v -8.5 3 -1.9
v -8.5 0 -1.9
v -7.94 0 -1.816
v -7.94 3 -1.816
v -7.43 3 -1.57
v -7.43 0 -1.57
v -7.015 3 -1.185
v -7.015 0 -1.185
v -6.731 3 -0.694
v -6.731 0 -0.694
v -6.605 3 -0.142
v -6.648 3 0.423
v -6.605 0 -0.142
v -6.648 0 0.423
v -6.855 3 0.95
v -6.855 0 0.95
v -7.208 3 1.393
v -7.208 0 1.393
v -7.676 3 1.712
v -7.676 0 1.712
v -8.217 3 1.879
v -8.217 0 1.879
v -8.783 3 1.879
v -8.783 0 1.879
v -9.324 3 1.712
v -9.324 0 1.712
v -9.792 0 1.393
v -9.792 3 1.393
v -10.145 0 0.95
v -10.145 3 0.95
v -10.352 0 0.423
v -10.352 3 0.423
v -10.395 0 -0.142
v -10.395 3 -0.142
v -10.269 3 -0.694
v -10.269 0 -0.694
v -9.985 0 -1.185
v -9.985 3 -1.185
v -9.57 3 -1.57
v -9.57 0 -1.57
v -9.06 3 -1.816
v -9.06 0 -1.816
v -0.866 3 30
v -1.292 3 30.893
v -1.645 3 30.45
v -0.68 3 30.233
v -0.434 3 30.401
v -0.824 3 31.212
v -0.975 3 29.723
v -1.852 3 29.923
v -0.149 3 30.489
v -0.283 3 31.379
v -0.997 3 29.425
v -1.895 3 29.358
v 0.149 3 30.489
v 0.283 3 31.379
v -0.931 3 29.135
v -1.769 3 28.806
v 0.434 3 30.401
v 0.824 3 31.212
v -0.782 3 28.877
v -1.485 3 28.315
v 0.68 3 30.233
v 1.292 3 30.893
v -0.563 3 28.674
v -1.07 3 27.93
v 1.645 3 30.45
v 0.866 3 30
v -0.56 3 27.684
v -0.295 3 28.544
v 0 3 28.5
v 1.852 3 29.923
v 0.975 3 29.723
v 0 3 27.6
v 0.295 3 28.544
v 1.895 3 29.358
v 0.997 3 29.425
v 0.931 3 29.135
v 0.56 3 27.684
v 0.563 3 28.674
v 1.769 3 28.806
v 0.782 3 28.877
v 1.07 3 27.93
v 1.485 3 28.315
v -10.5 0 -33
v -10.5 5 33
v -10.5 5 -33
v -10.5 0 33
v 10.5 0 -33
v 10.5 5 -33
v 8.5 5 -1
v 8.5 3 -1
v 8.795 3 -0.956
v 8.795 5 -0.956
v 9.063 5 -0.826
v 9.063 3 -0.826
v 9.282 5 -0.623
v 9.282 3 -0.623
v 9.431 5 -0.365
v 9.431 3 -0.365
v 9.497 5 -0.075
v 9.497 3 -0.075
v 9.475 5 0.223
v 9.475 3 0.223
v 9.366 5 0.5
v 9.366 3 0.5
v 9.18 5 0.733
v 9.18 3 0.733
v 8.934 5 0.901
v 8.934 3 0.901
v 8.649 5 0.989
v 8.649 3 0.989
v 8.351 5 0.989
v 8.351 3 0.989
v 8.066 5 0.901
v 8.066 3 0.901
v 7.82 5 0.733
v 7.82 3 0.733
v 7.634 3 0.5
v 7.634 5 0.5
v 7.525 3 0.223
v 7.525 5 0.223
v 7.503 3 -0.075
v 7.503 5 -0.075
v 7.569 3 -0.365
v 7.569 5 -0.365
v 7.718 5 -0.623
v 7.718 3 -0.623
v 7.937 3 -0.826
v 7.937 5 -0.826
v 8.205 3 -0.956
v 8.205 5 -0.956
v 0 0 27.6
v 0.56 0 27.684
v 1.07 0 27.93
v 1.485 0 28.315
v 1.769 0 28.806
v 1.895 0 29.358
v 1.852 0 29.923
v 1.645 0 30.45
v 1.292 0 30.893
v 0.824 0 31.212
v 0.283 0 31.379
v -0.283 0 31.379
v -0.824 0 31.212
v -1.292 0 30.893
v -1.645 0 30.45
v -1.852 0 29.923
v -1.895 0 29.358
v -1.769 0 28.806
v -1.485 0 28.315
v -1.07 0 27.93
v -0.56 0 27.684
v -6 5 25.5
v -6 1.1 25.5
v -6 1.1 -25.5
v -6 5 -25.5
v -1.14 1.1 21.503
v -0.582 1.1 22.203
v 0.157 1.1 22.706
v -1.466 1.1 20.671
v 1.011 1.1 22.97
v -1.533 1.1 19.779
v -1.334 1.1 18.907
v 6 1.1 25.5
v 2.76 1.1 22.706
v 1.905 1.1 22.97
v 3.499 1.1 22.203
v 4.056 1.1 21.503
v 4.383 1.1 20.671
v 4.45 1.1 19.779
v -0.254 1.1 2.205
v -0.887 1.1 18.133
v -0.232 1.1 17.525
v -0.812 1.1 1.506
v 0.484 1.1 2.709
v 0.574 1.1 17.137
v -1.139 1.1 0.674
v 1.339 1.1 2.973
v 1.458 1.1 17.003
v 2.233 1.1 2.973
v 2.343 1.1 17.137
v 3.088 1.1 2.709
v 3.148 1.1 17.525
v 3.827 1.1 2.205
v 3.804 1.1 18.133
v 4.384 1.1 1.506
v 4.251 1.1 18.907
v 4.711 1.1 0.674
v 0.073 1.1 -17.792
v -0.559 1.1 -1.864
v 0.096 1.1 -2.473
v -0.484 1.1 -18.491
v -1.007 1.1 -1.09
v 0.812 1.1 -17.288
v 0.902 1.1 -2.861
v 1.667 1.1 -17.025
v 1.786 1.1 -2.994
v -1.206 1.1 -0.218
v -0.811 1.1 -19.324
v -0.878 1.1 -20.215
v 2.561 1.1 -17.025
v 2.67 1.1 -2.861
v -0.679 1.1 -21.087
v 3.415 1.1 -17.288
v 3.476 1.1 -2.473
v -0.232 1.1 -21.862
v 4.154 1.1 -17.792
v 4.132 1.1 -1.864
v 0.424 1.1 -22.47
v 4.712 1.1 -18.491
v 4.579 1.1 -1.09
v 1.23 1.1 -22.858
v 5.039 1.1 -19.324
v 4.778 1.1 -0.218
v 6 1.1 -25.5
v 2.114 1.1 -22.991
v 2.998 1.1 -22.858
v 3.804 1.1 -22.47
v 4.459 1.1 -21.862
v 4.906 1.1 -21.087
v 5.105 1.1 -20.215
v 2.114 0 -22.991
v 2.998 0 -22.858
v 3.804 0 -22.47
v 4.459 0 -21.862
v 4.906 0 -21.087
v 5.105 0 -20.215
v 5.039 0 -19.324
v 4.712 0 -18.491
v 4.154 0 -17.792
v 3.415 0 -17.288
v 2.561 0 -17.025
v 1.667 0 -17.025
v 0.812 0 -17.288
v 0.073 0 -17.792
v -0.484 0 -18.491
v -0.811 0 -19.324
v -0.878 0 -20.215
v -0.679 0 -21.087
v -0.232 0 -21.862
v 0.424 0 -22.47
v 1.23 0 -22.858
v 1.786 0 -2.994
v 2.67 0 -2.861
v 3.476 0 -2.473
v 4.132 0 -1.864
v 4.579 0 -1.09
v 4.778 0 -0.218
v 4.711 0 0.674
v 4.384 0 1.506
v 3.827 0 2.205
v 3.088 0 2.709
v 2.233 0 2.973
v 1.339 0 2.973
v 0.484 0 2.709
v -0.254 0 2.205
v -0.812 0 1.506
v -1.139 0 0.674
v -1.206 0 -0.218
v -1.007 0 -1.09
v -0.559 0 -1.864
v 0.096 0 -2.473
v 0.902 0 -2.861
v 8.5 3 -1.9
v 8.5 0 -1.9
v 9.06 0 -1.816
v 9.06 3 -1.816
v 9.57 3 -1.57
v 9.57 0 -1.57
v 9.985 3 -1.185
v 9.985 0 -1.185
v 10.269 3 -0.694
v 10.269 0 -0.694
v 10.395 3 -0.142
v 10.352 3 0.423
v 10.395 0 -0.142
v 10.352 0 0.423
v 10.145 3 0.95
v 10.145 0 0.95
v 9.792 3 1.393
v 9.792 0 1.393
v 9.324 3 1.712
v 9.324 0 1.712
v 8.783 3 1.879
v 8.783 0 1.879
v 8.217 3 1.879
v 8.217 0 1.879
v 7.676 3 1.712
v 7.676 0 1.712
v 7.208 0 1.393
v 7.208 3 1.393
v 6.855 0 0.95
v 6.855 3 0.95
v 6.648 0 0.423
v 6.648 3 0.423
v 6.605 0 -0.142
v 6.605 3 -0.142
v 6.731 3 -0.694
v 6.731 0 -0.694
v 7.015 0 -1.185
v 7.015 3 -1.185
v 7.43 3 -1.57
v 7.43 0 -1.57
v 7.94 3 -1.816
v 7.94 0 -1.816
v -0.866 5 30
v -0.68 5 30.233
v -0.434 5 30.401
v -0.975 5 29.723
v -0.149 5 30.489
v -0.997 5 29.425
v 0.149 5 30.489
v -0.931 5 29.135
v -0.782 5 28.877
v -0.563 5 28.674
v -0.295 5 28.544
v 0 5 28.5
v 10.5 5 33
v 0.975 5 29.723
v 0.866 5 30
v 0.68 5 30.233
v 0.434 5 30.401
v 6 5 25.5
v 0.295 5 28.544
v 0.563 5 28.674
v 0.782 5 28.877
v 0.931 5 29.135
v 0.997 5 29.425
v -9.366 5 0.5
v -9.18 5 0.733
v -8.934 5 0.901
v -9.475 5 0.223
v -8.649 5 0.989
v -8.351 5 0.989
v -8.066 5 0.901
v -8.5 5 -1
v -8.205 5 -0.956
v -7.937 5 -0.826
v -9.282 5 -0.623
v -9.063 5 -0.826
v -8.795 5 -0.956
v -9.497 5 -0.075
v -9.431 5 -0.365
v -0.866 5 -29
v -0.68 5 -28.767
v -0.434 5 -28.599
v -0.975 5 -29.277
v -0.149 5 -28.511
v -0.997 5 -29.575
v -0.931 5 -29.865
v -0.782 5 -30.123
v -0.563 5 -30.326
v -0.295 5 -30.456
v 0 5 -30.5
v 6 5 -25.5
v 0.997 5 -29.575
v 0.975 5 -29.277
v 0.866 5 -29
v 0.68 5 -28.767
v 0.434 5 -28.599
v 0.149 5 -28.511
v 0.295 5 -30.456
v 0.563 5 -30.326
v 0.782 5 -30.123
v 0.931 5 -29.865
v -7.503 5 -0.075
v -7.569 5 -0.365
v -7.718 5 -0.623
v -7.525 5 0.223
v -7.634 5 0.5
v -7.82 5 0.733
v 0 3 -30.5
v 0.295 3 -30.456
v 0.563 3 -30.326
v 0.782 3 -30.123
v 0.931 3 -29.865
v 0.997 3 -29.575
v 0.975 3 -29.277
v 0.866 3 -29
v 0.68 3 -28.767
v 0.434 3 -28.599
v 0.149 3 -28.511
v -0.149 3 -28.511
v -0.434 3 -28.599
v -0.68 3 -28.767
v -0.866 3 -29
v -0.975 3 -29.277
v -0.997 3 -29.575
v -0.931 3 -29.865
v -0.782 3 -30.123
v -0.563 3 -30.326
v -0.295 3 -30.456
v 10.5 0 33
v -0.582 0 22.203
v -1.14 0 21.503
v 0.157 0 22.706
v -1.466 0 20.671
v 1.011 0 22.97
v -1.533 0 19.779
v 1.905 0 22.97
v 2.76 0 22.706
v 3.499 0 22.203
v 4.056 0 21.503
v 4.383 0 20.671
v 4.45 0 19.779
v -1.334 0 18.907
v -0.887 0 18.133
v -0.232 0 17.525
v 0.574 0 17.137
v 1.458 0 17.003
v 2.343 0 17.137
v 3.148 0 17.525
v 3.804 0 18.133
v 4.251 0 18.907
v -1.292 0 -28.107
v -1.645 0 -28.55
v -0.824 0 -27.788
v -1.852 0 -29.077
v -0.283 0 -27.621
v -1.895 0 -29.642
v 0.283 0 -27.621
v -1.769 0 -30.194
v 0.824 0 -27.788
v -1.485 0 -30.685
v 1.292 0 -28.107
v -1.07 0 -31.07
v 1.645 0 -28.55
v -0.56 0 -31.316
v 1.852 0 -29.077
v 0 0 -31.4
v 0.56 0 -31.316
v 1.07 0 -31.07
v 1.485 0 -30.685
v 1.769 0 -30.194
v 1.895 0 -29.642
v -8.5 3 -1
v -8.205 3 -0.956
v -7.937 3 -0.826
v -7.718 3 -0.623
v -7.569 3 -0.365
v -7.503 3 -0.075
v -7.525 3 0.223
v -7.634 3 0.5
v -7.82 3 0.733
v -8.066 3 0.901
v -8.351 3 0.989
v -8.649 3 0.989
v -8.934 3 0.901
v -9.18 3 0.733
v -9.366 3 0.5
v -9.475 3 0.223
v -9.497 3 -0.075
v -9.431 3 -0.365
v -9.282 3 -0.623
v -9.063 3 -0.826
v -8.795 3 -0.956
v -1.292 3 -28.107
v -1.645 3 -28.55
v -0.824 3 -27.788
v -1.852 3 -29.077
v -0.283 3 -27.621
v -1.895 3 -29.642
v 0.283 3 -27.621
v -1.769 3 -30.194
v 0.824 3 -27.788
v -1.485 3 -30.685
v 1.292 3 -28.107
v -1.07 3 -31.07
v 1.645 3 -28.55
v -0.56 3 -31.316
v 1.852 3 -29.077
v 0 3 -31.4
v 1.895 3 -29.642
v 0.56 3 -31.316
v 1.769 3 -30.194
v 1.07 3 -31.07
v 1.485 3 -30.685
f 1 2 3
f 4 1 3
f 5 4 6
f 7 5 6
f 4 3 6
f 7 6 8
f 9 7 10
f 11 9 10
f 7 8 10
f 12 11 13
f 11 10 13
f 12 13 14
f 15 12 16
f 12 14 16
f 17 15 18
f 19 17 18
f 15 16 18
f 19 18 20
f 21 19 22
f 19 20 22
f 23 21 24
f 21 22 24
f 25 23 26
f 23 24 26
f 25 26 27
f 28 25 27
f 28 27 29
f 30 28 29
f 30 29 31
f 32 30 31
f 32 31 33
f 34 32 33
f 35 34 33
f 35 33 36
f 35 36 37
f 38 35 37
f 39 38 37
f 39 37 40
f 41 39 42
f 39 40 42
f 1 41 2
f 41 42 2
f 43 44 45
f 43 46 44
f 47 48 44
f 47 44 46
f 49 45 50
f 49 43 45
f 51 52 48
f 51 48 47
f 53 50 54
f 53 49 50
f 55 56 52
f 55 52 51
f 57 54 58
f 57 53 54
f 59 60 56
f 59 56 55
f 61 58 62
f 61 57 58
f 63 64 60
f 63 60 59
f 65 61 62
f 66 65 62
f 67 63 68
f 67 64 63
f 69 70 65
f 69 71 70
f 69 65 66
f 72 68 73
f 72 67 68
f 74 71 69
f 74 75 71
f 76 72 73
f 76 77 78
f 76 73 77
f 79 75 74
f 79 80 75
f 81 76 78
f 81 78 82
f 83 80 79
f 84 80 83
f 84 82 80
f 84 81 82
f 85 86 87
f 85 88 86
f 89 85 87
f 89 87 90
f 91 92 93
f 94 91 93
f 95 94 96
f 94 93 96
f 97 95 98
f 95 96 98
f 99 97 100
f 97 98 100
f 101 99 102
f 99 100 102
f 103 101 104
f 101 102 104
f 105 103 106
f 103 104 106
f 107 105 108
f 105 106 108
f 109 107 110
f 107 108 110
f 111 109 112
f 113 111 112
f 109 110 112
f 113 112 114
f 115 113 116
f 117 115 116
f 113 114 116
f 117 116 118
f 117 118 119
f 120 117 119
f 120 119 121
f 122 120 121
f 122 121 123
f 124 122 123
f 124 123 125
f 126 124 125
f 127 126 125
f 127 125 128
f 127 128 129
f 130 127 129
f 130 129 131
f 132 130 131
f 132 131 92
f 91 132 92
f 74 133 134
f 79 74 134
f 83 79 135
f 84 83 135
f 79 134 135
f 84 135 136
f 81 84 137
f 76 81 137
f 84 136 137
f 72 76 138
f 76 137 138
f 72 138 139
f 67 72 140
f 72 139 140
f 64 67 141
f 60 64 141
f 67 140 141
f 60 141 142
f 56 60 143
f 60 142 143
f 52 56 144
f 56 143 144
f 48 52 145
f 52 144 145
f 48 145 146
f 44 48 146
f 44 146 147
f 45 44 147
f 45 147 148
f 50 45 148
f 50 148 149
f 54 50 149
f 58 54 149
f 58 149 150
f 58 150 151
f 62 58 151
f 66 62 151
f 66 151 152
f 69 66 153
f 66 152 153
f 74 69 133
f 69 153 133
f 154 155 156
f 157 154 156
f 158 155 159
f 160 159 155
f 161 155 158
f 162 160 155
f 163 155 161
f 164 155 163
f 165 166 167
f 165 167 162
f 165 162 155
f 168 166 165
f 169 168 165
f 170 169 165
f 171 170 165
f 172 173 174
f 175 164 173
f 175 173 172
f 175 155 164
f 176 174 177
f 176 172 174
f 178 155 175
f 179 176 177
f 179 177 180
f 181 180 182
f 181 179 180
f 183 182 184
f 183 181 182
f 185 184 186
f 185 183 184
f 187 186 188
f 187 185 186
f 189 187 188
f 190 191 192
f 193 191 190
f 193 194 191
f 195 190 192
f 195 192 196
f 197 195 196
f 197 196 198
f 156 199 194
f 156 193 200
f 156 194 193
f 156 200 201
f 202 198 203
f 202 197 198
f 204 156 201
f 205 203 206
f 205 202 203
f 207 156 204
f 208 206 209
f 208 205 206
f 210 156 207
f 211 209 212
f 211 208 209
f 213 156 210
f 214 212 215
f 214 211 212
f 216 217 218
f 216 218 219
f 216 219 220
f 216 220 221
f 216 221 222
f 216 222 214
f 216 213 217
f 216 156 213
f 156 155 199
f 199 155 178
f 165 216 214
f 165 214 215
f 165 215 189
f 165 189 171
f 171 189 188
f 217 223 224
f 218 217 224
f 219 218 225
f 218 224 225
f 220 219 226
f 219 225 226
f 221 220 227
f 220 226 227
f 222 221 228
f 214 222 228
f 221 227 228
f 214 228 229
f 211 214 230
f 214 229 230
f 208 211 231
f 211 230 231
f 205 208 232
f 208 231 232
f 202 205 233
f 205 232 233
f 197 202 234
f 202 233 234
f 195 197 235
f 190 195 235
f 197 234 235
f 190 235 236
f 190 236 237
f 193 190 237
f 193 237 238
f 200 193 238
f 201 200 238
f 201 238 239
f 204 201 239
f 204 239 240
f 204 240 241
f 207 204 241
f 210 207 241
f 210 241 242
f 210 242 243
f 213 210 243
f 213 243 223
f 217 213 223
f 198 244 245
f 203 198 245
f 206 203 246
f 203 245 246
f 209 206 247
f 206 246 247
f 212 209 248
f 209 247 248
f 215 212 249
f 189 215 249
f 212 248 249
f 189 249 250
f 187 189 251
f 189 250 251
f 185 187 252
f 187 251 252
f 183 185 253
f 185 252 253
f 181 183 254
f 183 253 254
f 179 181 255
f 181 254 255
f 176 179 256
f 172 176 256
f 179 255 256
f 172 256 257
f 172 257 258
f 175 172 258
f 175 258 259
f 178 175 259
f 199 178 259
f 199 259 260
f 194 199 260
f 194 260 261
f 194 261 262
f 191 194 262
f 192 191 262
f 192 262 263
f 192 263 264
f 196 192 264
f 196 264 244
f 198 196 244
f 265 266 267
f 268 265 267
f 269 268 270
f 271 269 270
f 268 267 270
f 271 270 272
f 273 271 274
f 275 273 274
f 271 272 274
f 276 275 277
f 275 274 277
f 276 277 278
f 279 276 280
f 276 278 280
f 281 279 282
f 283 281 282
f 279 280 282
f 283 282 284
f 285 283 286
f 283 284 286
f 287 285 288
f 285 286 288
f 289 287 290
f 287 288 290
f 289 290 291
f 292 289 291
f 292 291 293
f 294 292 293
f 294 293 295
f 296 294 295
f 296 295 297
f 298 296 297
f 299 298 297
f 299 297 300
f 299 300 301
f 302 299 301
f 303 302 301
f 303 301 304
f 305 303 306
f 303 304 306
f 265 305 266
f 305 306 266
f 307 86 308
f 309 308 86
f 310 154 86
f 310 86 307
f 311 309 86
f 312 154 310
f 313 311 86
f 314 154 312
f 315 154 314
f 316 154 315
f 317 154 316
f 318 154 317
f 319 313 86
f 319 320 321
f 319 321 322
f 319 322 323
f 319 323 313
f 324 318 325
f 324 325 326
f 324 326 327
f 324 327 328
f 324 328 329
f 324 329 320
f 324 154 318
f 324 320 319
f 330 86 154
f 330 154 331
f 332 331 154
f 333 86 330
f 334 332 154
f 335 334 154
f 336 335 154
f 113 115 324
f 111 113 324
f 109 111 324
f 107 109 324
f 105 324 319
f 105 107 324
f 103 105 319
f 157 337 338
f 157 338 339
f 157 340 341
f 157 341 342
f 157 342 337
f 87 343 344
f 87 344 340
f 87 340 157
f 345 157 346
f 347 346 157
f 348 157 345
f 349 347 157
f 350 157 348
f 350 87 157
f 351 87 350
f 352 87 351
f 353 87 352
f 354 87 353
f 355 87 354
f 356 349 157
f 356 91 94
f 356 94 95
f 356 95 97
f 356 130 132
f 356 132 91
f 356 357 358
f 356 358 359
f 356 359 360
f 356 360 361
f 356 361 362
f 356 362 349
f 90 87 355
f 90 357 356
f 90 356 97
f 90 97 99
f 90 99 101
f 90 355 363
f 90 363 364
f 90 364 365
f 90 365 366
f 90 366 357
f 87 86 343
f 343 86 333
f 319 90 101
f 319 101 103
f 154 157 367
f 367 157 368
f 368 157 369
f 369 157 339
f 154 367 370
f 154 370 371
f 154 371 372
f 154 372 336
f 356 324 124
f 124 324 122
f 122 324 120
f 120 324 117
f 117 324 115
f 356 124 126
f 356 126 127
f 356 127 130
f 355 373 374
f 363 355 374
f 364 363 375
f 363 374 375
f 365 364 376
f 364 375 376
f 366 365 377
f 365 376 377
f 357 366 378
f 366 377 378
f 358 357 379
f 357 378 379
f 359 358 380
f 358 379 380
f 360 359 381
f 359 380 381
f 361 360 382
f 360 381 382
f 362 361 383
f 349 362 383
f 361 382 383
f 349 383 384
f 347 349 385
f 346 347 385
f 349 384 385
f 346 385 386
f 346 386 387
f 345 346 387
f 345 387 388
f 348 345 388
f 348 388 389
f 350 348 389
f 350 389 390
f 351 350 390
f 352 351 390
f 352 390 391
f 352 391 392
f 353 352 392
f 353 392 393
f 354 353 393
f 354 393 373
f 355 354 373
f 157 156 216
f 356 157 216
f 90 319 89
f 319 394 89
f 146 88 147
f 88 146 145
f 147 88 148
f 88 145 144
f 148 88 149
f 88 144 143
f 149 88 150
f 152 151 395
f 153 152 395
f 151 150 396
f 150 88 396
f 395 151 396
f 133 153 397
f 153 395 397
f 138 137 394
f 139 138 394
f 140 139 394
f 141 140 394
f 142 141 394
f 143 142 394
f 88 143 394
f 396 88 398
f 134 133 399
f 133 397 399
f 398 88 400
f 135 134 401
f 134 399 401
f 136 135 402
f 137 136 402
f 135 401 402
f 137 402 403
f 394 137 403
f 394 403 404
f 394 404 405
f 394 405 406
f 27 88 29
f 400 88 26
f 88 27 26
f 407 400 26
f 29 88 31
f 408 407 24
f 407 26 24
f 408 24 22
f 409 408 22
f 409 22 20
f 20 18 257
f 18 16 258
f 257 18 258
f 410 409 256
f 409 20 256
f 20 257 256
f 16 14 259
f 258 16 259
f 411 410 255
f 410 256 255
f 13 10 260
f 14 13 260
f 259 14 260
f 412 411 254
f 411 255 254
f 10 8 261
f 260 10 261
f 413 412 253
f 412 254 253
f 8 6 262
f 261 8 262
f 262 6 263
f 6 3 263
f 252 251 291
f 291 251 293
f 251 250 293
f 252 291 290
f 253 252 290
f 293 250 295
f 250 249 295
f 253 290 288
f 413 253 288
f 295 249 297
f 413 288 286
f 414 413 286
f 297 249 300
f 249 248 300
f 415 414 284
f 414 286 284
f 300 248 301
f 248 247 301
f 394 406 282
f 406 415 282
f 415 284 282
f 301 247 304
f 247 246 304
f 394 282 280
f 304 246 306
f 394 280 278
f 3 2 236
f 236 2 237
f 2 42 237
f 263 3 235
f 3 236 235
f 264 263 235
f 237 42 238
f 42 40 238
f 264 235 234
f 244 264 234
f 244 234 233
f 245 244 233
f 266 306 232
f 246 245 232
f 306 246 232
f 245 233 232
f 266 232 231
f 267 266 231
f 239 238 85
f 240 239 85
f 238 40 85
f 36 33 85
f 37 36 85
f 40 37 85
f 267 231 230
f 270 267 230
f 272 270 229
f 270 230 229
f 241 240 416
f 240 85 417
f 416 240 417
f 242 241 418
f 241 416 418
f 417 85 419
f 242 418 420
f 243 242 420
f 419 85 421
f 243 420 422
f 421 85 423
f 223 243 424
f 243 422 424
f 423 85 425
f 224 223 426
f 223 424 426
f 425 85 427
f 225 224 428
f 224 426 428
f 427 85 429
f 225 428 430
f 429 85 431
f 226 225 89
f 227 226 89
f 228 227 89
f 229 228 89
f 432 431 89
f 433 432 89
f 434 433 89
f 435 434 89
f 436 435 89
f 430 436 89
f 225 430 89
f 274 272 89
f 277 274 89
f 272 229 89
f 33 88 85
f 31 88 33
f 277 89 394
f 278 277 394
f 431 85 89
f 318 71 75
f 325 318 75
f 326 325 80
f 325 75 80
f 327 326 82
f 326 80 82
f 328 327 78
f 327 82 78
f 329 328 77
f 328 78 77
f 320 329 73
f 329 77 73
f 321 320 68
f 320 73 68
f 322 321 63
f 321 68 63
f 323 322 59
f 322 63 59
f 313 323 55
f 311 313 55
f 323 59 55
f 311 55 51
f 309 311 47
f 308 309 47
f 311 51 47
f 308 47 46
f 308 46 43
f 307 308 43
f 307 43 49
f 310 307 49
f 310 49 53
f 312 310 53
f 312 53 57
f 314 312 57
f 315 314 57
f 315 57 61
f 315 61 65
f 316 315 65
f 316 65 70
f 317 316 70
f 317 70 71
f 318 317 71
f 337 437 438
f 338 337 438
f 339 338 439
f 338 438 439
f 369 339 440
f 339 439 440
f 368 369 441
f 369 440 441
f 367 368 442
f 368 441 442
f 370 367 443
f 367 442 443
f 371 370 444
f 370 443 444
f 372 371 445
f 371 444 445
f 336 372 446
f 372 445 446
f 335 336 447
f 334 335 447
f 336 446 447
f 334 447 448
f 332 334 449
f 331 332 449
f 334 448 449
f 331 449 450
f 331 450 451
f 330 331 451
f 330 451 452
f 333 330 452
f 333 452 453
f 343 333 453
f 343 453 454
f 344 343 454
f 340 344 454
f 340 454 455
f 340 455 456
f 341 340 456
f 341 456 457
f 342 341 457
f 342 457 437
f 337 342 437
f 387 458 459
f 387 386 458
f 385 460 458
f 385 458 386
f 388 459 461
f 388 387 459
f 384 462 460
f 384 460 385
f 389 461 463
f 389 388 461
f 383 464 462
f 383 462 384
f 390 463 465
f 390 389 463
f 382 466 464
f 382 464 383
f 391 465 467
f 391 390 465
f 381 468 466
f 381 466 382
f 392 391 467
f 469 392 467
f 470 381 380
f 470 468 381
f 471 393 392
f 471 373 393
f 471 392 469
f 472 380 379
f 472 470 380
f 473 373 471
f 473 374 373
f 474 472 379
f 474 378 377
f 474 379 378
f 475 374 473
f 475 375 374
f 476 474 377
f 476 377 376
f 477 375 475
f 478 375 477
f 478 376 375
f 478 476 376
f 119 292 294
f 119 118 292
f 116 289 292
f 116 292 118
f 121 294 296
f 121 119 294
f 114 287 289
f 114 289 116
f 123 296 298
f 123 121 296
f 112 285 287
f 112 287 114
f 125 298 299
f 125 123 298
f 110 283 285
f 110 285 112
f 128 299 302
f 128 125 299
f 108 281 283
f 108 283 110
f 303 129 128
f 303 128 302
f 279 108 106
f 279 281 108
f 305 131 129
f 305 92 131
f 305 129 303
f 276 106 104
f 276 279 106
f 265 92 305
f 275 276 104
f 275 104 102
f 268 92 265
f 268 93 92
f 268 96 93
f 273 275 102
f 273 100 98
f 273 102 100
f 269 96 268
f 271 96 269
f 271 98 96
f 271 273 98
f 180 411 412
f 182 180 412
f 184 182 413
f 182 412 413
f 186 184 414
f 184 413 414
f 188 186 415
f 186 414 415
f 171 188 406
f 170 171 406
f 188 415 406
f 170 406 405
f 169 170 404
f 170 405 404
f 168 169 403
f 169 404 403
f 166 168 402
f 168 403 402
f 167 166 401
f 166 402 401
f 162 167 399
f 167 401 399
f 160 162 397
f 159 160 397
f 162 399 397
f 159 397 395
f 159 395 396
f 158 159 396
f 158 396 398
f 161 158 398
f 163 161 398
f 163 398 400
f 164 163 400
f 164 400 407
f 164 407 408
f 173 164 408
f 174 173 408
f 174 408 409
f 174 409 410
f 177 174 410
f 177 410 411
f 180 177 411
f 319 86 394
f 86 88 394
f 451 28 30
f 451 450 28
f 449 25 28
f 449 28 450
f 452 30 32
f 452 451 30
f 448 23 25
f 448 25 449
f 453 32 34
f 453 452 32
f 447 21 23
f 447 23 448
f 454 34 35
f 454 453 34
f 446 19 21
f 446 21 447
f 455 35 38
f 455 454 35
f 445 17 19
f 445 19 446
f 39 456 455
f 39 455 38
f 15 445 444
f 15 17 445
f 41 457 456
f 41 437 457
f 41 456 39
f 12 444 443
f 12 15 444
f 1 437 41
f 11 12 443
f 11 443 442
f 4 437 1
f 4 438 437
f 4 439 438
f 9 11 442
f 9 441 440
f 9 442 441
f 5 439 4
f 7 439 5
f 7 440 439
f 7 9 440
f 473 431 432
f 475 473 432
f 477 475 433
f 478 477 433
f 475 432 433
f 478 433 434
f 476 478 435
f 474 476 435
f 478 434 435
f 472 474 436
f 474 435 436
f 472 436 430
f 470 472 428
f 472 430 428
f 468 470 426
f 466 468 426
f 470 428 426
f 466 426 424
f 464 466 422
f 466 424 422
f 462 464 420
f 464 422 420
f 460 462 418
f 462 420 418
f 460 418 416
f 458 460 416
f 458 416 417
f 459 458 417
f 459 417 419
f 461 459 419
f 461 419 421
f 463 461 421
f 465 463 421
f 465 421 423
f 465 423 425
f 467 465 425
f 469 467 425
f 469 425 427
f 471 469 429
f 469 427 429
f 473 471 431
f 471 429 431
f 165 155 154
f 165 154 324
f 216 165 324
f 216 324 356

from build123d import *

# Parameters (mm, degrees)
SKETCH_1_W          = 21
SKETCH_1_H          = 66
EXTRUDE_1_DEPTH     = 1.1
SKETCH_2_R          = 3
CUT_EXTRUDE_1_DEPTH = 35.647655043
SKETCH_3_W          = 21
SKETCH_3_H          = 66
SKETCH_3_W_2        = 12
SKETCH_3_H_2        = 51
EXTRUDE_2_DEPTH     = 3.9
SKETCH_4_R          = 1.9
SKETCH_4_R_2        = 1
CUT_EXTRUDE_2_DEPTH = 3
SKETCH_4_2_R        = 1
CUT_EXTRUDE_3_DEPTH = 35.989284074


with BuildPart() as part:
    # 草图1 → 凸台-拉伸1 (new body)
    with BuildSketch(Plane(origin=(0, 0, 0), x_dir=(1, 0, 0), z_dir=(0, 1, 0))):
        Rectangle(SKETCH_1_W, SKETCH_1_H)
    extrude(amount=EXTRUDE_1_DEPTH)

    # 草图2 → 切除-拉伸1 (cut, through all)
    with BuildSketch(Plane(origin=(0, 0, 0), x_dir=(-1, 0, 0), z_dir=(0, -1, 0))):
        with Locations(Location((-1.458325738, -20.003345868, 0), (0, 0, 90))):
            Circle(SKETCH_2_R)
        with Locations(Location((-1.786068296, -0.006031428, 0), (0, 0, 90))):
            Circle(SKETCH_2_R)
        with Locations(Location((-2.113810854, 19.991283012, 0), (0, 0, 90))):
            Circle(SKETCH_2_R)
    extrude(amount=-CUT_EXTRUDE_1_DEPTH, mode=Mode.SUBTRACT)

    # 草图3 → 凸台-拉伸2 (add)
    with BuildSketch(Plane(origin=(0, 1.1, 0), x_dir=(1, 0, 0), z_dir=(0, 1, 0))):
        Rectangle(SKETCH_3_W, SKETCH_3_H)
        Rectangle(SKETCH_3_W_2, SKETCH_3_H_2, mode=Mode.SUBTRACT)
    extrude(amount=EXTRUDE_2_DEPTH)

    # 草图4 → 切除-拉伸2 (cut)
    # profile 1 of 4: a face of its own
    with BuildSketch(Plane.XZ):
        with Locations(Location((0, 29.5, 0), (0, 0, 270))):
            Circle(SKETCH_4_R)
        with Locations(Location((0, 29.5, 0), (0, 0, 270))):
            Circle(SKETCH_4_R_2, mode=Mode.SUBTRACT)
    # profile 2 of 4: a face of its own
    with BuildSketch(Plane.XZ):
        with Locations(Location((-8.5, 0, 0), (0, 0, 270))):
            Circle(SKETCH_4_R)
        with Locations(Location((-8.5, 0, 0), (0, 0, 270))):
            Circle(SKETCH_4_R_2, mode=Mode.SUBTRACT)
    # profile 3 of 4: a face of its own
    with BuildSketch(Plane.XZ):
        with Locations(Location((8.5, 0, 0), (0, 0, 270))):
            Circle(SKETCH_4_R)
        with Locations(Location((8.5, 0, 0), (0, 0, 270))):
            Circle(SKETCH_4_R_2, mode=Mode.SUBTRACT)
    # profile 4 of 4: a face of its own
    with BuildSketch(Plane.XZ):
        with Locations(Location((0, -29.5, 0), (0, 0, 270))):
            Circle(SKETCH_4_R)
        with Locations(Location((0, -29.5, 0), (0, 0, 270))):
            Circle(SKETCH_4_R_2, mode=Mode.SUBTRACT)
    extrude(amount=-CUT_EXTRUDE_2_DEPTH, mode=Mode.SUBTRACT)

    # 草图4<2> → 切除-拉伸3 (cut, through all)
    with BuildSketch(Plane.XZ):
        with Locations(Location((-8.5, 0, 0), (0, 0, 270))):
            Circle(SKETCH_4_2_R)
        with Locations(Location((8.5, 0, 0), (0, 0, 270))):
            Circle(SKETCH_4_2_R)
        with Locations(Location((0, 29.5, 0), (0, 0, 270))):
            Circle(SKETCH_4_2_R)
        with Locations(Location((0, -29.5, 0), (0, 0, 270))):
            Circle(SKETCH_4_2_R)
    extrude(amount=-CUT_EXTRUDE_3_DEPTH, mode=Mode.SUBTRACT)


solid = part.part
